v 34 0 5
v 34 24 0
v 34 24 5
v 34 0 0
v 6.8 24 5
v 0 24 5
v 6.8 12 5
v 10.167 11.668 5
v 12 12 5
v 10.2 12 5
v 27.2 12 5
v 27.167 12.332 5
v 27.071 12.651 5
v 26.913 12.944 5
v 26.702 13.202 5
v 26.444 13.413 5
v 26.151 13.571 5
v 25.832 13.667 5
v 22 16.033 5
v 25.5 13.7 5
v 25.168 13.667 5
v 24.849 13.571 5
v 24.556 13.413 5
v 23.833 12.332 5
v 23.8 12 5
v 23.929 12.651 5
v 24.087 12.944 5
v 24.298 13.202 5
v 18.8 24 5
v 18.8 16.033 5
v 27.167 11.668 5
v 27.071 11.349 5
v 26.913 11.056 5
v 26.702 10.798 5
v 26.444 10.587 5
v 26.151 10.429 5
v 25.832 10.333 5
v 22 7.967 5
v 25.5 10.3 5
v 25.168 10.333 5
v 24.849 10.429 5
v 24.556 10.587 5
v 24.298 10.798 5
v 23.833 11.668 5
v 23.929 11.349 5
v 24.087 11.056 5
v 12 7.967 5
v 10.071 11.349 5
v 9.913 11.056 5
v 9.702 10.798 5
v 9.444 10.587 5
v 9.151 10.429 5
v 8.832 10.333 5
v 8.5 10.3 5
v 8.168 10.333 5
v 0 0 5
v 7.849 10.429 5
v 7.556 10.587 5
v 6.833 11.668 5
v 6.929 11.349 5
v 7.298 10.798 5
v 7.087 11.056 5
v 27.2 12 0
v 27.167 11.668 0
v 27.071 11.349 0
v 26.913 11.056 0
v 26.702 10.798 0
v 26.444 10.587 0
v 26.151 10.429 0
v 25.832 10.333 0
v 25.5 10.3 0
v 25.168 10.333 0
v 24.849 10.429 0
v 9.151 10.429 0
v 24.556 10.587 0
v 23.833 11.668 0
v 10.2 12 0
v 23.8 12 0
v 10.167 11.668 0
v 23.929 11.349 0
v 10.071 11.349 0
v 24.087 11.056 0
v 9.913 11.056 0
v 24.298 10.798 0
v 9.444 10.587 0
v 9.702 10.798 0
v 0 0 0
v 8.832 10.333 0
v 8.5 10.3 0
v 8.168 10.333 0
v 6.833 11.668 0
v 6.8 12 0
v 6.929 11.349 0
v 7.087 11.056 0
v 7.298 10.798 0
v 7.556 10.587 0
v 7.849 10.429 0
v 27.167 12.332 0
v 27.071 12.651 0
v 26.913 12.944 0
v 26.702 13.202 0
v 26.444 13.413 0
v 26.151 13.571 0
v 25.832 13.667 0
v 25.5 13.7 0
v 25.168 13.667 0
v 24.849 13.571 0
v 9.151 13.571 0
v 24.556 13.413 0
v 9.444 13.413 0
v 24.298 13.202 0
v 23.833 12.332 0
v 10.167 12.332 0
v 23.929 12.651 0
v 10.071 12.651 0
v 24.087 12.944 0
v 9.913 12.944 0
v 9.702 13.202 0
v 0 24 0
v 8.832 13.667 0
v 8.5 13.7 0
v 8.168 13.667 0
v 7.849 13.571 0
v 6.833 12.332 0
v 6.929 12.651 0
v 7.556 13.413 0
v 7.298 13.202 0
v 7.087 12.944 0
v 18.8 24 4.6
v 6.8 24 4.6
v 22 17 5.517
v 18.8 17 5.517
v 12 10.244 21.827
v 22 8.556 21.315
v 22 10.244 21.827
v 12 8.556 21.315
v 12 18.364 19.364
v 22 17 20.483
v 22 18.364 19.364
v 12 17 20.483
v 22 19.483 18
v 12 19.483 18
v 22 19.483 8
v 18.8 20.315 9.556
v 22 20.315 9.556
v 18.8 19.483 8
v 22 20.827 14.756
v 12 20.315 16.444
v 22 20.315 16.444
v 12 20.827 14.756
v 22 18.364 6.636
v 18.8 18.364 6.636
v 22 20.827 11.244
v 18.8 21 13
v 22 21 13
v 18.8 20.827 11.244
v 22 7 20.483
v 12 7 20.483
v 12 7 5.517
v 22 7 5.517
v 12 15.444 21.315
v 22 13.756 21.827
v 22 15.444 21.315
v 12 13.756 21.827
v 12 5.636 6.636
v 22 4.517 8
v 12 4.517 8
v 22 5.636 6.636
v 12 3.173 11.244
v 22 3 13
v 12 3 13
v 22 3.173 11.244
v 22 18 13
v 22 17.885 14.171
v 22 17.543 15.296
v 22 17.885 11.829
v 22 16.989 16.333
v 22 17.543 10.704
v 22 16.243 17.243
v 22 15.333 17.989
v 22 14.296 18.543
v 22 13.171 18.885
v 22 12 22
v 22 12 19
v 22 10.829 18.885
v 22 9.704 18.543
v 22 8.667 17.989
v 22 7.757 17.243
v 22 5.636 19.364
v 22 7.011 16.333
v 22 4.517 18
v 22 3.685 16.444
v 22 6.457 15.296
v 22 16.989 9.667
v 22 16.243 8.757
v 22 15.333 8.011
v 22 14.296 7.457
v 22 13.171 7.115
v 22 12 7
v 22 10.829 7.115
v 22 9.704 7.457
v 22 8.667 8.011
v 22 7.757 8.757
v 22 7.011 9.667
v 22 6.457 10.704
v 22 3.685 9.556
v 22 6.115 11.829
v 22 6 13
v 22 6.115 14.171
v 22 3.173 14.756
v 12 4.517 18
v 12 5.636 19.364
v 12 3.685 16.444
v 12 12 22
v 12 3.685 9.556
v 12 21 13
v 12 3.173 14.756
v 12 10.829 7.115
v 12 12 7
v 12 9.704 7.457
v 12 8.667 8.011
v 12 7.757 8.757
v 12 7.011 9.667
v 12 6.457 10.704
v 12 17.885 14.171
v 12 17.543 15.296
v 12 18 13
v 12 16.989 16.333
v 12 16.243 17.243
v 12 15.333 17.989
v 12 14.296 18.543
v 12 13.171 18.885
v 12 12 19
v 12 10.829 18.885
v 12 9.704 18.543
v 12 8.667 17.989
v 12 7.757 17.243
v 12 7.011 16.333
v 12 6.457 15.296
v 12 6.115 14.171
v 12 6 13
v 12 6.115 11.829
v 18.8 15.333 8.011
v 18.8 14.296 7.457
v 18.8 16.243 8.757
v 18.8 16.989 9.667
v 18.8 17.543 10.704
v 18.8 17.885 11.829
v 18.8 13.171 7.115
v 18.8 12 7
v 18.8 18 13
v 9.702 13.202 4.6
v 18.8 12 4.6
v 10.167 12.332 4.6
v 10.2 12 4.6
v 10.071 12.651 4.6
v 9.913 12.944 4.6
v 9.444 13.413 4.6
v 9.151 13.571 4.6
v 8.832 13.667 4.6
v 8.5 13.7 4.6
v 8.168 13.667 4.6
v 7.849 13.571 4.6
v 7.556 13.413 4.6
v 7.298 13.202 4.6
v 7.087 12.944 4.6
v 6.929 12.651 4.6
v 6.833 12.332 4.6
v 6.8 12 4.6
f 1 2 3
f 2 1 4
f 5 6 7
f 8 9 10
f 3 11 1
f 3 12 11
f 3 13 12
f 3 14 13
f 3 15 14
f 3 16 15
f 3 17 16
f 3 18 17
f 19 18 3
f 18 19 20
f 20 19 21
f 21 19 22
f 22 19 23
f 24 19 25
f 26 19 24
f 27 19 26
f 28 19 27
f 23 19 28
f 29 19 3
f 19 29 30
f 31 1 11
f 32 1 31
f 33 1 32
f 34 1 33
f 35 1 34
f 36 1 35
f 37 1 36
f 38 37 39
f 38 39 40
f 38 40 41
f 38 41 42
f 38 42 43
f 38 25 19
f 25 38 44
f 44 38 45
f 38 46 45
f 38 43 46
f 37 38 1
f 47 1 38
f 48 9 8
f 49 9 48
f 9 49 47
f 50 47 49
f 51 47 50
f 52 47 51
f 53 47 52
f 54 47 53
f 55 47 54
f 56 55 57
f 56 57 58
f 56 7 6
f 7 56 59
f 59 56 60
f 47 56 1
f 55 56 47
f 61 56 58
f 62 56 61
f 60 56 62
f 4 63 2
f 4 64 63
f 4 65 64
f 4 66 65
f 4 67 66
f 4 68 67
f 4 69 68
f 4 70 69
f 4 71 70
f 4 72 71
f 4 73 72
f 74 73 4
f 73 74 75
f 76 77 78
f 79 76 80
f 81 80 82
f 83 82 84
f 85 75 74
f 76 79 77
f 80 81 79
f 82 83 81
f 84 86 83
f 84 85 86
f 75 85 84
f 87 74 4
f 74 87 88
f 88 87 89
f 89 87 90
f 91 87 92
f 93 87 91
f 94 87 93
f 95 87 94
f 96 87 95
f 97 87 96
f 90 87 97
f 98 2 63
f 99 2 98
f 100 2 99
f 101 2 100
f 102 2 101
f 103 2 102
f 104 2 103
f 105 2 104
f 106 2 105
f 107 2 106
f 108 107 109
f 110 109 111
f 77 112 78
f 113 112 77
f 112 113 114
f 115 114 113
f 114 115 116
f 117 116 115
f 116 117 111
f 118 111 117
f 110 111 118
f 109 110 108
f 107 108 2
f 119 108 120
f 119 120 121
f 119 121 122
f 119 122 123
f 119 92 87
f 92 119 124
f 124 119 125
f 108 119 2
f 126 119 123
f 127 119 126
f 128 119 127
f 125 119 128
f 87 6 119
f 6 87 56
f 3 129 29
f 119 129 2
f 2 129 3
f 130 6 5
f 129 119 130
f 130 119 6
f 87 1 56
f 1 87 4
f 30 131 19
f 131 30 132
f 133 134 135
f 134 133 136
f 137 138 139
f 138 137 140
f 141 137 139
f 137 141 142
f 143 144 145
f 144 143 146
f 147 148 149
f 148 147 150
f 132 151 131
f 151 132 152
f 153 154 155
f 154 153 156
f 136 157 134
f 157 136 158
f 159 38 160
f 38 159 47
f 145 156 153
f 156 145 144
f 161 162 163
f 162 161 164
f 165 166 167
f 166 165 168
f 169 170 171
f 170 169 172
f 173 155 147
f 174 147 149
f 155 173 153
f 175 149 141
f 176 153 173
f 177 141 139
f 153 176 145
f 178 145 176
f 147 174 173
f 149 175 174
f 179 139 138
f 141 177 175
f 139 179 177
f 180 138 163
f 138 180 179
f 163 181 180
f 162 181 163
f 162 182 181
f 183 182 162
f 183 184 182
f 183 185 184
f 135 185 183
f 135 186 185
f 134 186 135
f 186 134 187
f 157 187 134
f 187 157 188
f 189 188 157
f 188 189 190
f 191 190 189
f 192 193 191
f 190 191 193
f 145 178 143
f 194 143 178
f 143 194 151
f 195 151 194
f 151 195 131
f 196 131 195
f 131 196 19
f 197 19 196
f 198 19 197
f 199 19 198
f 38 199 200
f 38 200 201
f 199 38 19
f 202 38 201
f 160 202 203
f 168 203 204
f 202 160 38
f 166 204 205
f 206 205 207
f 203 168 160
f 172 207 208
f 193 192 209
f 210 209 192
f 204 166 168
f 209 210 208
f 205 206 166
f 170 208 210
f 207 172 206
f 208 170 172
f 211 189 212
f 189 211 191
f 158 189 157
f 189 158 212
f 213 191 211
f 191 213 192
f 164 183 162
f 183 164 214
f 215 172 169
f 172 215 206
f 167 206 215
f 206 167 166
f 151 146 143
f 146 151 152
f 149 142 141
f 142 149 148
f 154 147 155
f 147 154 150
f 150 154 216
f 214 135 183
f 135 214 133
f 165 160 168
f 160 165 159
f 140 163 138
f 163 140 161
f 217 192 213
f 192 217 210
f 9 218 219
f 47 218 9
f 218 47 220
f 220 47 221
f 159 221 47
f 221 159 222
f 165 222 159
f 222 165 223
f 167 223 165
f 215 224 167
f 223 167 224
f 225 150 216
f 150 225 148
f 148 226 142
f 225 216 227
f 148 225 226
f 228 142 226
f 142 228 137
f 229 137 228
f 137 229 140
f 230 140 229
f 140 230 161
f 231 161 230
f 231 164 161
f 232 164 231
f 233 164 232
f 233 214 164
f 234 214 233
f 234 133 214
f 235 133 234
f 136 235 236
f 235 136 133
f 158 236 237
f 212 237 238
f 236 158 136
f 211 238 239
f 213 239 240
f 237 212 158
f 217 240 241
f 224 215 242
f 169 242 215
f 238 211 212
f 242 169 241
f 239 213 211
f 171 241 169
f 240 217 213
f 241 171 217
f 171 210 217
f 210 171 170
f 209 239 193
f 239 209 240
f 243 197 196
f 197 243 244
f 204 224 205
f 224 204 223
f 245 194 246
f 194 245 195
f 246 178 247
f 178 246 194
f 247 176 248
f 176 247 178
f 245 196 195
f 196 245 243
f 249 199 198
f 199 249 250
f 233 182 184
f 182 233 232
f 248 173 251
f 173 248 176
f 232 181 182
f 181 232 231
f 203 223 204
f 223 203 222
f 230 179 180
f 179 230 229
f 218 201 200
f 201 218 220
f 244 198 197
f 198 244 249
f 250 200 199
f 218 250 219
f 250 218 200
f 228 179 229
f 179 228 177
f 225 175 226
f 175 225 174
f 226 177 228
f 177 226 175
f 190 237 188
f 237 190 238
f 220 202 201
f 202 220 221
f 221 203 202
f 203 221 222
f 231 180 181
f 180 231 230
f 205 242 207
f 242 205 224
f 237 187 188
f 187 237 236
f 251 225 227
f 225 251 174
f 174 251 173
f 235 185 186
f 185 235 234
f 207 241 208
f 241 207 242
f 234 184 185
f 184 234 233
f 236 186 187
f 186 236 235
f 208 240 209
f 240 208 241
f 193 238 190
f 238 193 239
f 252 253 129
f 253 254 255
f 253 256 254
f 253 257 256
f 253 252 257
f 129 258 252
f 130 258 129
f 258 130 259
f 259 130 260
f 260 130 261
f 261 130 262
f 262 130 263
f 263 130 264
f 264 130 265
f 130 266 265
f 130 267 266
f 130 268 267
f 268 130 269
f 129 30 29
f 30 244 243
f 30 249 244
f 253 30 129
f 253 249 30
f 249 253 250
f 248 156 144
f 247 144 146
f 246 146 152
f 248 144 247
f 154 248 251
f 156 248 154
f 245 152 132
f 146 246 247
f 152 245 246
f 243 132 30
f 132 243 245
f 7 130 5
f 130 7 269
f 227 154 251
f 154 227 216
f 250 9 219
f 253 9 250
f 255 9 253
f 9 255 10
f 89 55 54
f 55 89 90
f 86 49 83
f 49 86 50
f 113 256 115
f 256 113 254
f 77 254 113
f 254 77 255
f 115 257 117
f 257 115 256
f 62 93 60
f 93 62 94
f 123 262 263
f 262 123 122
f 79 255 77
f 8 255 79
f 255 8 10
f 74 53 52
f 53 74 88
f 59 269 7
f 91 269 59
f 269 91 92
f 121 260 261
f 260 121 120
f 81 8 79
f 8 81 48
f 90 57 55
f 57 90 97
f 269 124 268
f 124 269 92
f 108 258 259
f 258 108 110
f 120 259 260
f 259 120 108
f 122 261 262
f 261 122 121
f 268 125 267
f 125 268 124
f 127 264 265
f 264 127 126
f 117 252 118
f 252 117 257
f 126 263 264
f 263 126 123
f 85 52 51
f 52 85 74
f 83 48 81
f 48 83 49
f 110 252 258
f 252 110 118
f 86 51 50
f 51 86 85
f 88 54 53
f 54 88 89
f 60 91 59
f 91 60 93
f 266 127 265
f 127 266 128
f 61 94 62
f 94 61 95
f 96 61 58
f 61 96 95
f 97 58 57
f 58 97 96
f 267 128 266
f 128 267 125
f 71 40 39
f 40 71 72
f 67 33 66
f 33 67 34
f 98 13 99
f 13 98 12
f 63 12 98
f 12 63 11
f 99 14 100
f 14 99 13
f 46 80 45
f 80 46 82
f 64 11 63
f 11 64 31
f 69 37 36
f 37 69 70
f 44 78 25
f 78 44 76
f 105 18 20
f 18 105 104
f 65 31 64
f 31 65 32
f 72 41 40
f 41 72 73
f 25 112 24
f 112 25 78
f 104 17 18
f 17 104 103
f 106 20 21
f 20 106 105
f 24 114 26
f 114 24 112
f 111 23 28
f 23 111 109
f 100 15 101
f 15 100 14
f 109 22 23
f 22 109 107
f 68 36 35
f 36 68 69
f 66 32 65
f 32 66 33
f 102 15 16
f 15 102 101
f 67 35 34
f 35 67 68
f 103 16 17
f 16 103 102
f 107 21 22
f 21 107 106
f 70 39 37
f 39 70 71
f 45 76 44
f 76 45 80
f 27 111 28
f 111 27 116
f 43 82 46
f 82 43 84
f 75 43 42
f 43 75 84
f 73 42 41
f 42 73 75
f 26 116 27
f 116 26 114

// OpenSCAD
$fn = 32;

// ----------------------------------------------------------------------
// Cable clip: cable 12 mm, clamp 18 mm, base 34 mm
// ----------------------------------------------------------------------

// --- parameters (mm) ---
foot_w = 34;              // base length, X
foot_d = 24;              // base width, Y
foot_t = 5;               // base thickness
hose_seat_d = 18;         // clamp outside diameter
ring_t = 3;               // clamp wall
cable_d = 12;             // cable opening
ring_w = 10;              // clamp width along the cable
screw_d = 3.4;            // screw clearance
throat = 8.4;             // snap throat width
sink = 1;                 // overlap of the clamp into the base

module base() {
  cube([foot_w, foot_d, foot_t]);
}

module clamp() {
  translate([foot_w / 2, foot_d / 2, foot_t + hose_seat_d / 2 - sink]) rotate([0, 90, 0])
    cylinder(h = ring_w, d = hose_seat_d, center = true);
}

difference() {
  union() {
    base();
    clamp();
  }
  translate([foot_w / 2, foot_d / 2, foot_t + hose_seat_d / 2 - sink]) rotate([0, 90, 0]) translate([0, 0, -ring_w / 2 - 1]) cylinder(h = ring_w + 2, d = cable_d);
  /* snap throat: the opening is narrower than the cable */
  translate([foot_w / 2 - throat / 2, foot_d / 2, foot_t + hose_seat_d / 2 - sink]) rotate([0, 90, 0]) translate([0, 0, -ring_w / 2 - 1]) cube([throat, hose_seat_d + 2, ring_w + 2]);
  translate([8.5, foot_d / 2, -1]) cylinder(h = foot_t + 2, d = screw_d);
  translate([25.5, foot_d / 2, -1]) cylinder(h = foot_t + 2, d = screw_d);
}
